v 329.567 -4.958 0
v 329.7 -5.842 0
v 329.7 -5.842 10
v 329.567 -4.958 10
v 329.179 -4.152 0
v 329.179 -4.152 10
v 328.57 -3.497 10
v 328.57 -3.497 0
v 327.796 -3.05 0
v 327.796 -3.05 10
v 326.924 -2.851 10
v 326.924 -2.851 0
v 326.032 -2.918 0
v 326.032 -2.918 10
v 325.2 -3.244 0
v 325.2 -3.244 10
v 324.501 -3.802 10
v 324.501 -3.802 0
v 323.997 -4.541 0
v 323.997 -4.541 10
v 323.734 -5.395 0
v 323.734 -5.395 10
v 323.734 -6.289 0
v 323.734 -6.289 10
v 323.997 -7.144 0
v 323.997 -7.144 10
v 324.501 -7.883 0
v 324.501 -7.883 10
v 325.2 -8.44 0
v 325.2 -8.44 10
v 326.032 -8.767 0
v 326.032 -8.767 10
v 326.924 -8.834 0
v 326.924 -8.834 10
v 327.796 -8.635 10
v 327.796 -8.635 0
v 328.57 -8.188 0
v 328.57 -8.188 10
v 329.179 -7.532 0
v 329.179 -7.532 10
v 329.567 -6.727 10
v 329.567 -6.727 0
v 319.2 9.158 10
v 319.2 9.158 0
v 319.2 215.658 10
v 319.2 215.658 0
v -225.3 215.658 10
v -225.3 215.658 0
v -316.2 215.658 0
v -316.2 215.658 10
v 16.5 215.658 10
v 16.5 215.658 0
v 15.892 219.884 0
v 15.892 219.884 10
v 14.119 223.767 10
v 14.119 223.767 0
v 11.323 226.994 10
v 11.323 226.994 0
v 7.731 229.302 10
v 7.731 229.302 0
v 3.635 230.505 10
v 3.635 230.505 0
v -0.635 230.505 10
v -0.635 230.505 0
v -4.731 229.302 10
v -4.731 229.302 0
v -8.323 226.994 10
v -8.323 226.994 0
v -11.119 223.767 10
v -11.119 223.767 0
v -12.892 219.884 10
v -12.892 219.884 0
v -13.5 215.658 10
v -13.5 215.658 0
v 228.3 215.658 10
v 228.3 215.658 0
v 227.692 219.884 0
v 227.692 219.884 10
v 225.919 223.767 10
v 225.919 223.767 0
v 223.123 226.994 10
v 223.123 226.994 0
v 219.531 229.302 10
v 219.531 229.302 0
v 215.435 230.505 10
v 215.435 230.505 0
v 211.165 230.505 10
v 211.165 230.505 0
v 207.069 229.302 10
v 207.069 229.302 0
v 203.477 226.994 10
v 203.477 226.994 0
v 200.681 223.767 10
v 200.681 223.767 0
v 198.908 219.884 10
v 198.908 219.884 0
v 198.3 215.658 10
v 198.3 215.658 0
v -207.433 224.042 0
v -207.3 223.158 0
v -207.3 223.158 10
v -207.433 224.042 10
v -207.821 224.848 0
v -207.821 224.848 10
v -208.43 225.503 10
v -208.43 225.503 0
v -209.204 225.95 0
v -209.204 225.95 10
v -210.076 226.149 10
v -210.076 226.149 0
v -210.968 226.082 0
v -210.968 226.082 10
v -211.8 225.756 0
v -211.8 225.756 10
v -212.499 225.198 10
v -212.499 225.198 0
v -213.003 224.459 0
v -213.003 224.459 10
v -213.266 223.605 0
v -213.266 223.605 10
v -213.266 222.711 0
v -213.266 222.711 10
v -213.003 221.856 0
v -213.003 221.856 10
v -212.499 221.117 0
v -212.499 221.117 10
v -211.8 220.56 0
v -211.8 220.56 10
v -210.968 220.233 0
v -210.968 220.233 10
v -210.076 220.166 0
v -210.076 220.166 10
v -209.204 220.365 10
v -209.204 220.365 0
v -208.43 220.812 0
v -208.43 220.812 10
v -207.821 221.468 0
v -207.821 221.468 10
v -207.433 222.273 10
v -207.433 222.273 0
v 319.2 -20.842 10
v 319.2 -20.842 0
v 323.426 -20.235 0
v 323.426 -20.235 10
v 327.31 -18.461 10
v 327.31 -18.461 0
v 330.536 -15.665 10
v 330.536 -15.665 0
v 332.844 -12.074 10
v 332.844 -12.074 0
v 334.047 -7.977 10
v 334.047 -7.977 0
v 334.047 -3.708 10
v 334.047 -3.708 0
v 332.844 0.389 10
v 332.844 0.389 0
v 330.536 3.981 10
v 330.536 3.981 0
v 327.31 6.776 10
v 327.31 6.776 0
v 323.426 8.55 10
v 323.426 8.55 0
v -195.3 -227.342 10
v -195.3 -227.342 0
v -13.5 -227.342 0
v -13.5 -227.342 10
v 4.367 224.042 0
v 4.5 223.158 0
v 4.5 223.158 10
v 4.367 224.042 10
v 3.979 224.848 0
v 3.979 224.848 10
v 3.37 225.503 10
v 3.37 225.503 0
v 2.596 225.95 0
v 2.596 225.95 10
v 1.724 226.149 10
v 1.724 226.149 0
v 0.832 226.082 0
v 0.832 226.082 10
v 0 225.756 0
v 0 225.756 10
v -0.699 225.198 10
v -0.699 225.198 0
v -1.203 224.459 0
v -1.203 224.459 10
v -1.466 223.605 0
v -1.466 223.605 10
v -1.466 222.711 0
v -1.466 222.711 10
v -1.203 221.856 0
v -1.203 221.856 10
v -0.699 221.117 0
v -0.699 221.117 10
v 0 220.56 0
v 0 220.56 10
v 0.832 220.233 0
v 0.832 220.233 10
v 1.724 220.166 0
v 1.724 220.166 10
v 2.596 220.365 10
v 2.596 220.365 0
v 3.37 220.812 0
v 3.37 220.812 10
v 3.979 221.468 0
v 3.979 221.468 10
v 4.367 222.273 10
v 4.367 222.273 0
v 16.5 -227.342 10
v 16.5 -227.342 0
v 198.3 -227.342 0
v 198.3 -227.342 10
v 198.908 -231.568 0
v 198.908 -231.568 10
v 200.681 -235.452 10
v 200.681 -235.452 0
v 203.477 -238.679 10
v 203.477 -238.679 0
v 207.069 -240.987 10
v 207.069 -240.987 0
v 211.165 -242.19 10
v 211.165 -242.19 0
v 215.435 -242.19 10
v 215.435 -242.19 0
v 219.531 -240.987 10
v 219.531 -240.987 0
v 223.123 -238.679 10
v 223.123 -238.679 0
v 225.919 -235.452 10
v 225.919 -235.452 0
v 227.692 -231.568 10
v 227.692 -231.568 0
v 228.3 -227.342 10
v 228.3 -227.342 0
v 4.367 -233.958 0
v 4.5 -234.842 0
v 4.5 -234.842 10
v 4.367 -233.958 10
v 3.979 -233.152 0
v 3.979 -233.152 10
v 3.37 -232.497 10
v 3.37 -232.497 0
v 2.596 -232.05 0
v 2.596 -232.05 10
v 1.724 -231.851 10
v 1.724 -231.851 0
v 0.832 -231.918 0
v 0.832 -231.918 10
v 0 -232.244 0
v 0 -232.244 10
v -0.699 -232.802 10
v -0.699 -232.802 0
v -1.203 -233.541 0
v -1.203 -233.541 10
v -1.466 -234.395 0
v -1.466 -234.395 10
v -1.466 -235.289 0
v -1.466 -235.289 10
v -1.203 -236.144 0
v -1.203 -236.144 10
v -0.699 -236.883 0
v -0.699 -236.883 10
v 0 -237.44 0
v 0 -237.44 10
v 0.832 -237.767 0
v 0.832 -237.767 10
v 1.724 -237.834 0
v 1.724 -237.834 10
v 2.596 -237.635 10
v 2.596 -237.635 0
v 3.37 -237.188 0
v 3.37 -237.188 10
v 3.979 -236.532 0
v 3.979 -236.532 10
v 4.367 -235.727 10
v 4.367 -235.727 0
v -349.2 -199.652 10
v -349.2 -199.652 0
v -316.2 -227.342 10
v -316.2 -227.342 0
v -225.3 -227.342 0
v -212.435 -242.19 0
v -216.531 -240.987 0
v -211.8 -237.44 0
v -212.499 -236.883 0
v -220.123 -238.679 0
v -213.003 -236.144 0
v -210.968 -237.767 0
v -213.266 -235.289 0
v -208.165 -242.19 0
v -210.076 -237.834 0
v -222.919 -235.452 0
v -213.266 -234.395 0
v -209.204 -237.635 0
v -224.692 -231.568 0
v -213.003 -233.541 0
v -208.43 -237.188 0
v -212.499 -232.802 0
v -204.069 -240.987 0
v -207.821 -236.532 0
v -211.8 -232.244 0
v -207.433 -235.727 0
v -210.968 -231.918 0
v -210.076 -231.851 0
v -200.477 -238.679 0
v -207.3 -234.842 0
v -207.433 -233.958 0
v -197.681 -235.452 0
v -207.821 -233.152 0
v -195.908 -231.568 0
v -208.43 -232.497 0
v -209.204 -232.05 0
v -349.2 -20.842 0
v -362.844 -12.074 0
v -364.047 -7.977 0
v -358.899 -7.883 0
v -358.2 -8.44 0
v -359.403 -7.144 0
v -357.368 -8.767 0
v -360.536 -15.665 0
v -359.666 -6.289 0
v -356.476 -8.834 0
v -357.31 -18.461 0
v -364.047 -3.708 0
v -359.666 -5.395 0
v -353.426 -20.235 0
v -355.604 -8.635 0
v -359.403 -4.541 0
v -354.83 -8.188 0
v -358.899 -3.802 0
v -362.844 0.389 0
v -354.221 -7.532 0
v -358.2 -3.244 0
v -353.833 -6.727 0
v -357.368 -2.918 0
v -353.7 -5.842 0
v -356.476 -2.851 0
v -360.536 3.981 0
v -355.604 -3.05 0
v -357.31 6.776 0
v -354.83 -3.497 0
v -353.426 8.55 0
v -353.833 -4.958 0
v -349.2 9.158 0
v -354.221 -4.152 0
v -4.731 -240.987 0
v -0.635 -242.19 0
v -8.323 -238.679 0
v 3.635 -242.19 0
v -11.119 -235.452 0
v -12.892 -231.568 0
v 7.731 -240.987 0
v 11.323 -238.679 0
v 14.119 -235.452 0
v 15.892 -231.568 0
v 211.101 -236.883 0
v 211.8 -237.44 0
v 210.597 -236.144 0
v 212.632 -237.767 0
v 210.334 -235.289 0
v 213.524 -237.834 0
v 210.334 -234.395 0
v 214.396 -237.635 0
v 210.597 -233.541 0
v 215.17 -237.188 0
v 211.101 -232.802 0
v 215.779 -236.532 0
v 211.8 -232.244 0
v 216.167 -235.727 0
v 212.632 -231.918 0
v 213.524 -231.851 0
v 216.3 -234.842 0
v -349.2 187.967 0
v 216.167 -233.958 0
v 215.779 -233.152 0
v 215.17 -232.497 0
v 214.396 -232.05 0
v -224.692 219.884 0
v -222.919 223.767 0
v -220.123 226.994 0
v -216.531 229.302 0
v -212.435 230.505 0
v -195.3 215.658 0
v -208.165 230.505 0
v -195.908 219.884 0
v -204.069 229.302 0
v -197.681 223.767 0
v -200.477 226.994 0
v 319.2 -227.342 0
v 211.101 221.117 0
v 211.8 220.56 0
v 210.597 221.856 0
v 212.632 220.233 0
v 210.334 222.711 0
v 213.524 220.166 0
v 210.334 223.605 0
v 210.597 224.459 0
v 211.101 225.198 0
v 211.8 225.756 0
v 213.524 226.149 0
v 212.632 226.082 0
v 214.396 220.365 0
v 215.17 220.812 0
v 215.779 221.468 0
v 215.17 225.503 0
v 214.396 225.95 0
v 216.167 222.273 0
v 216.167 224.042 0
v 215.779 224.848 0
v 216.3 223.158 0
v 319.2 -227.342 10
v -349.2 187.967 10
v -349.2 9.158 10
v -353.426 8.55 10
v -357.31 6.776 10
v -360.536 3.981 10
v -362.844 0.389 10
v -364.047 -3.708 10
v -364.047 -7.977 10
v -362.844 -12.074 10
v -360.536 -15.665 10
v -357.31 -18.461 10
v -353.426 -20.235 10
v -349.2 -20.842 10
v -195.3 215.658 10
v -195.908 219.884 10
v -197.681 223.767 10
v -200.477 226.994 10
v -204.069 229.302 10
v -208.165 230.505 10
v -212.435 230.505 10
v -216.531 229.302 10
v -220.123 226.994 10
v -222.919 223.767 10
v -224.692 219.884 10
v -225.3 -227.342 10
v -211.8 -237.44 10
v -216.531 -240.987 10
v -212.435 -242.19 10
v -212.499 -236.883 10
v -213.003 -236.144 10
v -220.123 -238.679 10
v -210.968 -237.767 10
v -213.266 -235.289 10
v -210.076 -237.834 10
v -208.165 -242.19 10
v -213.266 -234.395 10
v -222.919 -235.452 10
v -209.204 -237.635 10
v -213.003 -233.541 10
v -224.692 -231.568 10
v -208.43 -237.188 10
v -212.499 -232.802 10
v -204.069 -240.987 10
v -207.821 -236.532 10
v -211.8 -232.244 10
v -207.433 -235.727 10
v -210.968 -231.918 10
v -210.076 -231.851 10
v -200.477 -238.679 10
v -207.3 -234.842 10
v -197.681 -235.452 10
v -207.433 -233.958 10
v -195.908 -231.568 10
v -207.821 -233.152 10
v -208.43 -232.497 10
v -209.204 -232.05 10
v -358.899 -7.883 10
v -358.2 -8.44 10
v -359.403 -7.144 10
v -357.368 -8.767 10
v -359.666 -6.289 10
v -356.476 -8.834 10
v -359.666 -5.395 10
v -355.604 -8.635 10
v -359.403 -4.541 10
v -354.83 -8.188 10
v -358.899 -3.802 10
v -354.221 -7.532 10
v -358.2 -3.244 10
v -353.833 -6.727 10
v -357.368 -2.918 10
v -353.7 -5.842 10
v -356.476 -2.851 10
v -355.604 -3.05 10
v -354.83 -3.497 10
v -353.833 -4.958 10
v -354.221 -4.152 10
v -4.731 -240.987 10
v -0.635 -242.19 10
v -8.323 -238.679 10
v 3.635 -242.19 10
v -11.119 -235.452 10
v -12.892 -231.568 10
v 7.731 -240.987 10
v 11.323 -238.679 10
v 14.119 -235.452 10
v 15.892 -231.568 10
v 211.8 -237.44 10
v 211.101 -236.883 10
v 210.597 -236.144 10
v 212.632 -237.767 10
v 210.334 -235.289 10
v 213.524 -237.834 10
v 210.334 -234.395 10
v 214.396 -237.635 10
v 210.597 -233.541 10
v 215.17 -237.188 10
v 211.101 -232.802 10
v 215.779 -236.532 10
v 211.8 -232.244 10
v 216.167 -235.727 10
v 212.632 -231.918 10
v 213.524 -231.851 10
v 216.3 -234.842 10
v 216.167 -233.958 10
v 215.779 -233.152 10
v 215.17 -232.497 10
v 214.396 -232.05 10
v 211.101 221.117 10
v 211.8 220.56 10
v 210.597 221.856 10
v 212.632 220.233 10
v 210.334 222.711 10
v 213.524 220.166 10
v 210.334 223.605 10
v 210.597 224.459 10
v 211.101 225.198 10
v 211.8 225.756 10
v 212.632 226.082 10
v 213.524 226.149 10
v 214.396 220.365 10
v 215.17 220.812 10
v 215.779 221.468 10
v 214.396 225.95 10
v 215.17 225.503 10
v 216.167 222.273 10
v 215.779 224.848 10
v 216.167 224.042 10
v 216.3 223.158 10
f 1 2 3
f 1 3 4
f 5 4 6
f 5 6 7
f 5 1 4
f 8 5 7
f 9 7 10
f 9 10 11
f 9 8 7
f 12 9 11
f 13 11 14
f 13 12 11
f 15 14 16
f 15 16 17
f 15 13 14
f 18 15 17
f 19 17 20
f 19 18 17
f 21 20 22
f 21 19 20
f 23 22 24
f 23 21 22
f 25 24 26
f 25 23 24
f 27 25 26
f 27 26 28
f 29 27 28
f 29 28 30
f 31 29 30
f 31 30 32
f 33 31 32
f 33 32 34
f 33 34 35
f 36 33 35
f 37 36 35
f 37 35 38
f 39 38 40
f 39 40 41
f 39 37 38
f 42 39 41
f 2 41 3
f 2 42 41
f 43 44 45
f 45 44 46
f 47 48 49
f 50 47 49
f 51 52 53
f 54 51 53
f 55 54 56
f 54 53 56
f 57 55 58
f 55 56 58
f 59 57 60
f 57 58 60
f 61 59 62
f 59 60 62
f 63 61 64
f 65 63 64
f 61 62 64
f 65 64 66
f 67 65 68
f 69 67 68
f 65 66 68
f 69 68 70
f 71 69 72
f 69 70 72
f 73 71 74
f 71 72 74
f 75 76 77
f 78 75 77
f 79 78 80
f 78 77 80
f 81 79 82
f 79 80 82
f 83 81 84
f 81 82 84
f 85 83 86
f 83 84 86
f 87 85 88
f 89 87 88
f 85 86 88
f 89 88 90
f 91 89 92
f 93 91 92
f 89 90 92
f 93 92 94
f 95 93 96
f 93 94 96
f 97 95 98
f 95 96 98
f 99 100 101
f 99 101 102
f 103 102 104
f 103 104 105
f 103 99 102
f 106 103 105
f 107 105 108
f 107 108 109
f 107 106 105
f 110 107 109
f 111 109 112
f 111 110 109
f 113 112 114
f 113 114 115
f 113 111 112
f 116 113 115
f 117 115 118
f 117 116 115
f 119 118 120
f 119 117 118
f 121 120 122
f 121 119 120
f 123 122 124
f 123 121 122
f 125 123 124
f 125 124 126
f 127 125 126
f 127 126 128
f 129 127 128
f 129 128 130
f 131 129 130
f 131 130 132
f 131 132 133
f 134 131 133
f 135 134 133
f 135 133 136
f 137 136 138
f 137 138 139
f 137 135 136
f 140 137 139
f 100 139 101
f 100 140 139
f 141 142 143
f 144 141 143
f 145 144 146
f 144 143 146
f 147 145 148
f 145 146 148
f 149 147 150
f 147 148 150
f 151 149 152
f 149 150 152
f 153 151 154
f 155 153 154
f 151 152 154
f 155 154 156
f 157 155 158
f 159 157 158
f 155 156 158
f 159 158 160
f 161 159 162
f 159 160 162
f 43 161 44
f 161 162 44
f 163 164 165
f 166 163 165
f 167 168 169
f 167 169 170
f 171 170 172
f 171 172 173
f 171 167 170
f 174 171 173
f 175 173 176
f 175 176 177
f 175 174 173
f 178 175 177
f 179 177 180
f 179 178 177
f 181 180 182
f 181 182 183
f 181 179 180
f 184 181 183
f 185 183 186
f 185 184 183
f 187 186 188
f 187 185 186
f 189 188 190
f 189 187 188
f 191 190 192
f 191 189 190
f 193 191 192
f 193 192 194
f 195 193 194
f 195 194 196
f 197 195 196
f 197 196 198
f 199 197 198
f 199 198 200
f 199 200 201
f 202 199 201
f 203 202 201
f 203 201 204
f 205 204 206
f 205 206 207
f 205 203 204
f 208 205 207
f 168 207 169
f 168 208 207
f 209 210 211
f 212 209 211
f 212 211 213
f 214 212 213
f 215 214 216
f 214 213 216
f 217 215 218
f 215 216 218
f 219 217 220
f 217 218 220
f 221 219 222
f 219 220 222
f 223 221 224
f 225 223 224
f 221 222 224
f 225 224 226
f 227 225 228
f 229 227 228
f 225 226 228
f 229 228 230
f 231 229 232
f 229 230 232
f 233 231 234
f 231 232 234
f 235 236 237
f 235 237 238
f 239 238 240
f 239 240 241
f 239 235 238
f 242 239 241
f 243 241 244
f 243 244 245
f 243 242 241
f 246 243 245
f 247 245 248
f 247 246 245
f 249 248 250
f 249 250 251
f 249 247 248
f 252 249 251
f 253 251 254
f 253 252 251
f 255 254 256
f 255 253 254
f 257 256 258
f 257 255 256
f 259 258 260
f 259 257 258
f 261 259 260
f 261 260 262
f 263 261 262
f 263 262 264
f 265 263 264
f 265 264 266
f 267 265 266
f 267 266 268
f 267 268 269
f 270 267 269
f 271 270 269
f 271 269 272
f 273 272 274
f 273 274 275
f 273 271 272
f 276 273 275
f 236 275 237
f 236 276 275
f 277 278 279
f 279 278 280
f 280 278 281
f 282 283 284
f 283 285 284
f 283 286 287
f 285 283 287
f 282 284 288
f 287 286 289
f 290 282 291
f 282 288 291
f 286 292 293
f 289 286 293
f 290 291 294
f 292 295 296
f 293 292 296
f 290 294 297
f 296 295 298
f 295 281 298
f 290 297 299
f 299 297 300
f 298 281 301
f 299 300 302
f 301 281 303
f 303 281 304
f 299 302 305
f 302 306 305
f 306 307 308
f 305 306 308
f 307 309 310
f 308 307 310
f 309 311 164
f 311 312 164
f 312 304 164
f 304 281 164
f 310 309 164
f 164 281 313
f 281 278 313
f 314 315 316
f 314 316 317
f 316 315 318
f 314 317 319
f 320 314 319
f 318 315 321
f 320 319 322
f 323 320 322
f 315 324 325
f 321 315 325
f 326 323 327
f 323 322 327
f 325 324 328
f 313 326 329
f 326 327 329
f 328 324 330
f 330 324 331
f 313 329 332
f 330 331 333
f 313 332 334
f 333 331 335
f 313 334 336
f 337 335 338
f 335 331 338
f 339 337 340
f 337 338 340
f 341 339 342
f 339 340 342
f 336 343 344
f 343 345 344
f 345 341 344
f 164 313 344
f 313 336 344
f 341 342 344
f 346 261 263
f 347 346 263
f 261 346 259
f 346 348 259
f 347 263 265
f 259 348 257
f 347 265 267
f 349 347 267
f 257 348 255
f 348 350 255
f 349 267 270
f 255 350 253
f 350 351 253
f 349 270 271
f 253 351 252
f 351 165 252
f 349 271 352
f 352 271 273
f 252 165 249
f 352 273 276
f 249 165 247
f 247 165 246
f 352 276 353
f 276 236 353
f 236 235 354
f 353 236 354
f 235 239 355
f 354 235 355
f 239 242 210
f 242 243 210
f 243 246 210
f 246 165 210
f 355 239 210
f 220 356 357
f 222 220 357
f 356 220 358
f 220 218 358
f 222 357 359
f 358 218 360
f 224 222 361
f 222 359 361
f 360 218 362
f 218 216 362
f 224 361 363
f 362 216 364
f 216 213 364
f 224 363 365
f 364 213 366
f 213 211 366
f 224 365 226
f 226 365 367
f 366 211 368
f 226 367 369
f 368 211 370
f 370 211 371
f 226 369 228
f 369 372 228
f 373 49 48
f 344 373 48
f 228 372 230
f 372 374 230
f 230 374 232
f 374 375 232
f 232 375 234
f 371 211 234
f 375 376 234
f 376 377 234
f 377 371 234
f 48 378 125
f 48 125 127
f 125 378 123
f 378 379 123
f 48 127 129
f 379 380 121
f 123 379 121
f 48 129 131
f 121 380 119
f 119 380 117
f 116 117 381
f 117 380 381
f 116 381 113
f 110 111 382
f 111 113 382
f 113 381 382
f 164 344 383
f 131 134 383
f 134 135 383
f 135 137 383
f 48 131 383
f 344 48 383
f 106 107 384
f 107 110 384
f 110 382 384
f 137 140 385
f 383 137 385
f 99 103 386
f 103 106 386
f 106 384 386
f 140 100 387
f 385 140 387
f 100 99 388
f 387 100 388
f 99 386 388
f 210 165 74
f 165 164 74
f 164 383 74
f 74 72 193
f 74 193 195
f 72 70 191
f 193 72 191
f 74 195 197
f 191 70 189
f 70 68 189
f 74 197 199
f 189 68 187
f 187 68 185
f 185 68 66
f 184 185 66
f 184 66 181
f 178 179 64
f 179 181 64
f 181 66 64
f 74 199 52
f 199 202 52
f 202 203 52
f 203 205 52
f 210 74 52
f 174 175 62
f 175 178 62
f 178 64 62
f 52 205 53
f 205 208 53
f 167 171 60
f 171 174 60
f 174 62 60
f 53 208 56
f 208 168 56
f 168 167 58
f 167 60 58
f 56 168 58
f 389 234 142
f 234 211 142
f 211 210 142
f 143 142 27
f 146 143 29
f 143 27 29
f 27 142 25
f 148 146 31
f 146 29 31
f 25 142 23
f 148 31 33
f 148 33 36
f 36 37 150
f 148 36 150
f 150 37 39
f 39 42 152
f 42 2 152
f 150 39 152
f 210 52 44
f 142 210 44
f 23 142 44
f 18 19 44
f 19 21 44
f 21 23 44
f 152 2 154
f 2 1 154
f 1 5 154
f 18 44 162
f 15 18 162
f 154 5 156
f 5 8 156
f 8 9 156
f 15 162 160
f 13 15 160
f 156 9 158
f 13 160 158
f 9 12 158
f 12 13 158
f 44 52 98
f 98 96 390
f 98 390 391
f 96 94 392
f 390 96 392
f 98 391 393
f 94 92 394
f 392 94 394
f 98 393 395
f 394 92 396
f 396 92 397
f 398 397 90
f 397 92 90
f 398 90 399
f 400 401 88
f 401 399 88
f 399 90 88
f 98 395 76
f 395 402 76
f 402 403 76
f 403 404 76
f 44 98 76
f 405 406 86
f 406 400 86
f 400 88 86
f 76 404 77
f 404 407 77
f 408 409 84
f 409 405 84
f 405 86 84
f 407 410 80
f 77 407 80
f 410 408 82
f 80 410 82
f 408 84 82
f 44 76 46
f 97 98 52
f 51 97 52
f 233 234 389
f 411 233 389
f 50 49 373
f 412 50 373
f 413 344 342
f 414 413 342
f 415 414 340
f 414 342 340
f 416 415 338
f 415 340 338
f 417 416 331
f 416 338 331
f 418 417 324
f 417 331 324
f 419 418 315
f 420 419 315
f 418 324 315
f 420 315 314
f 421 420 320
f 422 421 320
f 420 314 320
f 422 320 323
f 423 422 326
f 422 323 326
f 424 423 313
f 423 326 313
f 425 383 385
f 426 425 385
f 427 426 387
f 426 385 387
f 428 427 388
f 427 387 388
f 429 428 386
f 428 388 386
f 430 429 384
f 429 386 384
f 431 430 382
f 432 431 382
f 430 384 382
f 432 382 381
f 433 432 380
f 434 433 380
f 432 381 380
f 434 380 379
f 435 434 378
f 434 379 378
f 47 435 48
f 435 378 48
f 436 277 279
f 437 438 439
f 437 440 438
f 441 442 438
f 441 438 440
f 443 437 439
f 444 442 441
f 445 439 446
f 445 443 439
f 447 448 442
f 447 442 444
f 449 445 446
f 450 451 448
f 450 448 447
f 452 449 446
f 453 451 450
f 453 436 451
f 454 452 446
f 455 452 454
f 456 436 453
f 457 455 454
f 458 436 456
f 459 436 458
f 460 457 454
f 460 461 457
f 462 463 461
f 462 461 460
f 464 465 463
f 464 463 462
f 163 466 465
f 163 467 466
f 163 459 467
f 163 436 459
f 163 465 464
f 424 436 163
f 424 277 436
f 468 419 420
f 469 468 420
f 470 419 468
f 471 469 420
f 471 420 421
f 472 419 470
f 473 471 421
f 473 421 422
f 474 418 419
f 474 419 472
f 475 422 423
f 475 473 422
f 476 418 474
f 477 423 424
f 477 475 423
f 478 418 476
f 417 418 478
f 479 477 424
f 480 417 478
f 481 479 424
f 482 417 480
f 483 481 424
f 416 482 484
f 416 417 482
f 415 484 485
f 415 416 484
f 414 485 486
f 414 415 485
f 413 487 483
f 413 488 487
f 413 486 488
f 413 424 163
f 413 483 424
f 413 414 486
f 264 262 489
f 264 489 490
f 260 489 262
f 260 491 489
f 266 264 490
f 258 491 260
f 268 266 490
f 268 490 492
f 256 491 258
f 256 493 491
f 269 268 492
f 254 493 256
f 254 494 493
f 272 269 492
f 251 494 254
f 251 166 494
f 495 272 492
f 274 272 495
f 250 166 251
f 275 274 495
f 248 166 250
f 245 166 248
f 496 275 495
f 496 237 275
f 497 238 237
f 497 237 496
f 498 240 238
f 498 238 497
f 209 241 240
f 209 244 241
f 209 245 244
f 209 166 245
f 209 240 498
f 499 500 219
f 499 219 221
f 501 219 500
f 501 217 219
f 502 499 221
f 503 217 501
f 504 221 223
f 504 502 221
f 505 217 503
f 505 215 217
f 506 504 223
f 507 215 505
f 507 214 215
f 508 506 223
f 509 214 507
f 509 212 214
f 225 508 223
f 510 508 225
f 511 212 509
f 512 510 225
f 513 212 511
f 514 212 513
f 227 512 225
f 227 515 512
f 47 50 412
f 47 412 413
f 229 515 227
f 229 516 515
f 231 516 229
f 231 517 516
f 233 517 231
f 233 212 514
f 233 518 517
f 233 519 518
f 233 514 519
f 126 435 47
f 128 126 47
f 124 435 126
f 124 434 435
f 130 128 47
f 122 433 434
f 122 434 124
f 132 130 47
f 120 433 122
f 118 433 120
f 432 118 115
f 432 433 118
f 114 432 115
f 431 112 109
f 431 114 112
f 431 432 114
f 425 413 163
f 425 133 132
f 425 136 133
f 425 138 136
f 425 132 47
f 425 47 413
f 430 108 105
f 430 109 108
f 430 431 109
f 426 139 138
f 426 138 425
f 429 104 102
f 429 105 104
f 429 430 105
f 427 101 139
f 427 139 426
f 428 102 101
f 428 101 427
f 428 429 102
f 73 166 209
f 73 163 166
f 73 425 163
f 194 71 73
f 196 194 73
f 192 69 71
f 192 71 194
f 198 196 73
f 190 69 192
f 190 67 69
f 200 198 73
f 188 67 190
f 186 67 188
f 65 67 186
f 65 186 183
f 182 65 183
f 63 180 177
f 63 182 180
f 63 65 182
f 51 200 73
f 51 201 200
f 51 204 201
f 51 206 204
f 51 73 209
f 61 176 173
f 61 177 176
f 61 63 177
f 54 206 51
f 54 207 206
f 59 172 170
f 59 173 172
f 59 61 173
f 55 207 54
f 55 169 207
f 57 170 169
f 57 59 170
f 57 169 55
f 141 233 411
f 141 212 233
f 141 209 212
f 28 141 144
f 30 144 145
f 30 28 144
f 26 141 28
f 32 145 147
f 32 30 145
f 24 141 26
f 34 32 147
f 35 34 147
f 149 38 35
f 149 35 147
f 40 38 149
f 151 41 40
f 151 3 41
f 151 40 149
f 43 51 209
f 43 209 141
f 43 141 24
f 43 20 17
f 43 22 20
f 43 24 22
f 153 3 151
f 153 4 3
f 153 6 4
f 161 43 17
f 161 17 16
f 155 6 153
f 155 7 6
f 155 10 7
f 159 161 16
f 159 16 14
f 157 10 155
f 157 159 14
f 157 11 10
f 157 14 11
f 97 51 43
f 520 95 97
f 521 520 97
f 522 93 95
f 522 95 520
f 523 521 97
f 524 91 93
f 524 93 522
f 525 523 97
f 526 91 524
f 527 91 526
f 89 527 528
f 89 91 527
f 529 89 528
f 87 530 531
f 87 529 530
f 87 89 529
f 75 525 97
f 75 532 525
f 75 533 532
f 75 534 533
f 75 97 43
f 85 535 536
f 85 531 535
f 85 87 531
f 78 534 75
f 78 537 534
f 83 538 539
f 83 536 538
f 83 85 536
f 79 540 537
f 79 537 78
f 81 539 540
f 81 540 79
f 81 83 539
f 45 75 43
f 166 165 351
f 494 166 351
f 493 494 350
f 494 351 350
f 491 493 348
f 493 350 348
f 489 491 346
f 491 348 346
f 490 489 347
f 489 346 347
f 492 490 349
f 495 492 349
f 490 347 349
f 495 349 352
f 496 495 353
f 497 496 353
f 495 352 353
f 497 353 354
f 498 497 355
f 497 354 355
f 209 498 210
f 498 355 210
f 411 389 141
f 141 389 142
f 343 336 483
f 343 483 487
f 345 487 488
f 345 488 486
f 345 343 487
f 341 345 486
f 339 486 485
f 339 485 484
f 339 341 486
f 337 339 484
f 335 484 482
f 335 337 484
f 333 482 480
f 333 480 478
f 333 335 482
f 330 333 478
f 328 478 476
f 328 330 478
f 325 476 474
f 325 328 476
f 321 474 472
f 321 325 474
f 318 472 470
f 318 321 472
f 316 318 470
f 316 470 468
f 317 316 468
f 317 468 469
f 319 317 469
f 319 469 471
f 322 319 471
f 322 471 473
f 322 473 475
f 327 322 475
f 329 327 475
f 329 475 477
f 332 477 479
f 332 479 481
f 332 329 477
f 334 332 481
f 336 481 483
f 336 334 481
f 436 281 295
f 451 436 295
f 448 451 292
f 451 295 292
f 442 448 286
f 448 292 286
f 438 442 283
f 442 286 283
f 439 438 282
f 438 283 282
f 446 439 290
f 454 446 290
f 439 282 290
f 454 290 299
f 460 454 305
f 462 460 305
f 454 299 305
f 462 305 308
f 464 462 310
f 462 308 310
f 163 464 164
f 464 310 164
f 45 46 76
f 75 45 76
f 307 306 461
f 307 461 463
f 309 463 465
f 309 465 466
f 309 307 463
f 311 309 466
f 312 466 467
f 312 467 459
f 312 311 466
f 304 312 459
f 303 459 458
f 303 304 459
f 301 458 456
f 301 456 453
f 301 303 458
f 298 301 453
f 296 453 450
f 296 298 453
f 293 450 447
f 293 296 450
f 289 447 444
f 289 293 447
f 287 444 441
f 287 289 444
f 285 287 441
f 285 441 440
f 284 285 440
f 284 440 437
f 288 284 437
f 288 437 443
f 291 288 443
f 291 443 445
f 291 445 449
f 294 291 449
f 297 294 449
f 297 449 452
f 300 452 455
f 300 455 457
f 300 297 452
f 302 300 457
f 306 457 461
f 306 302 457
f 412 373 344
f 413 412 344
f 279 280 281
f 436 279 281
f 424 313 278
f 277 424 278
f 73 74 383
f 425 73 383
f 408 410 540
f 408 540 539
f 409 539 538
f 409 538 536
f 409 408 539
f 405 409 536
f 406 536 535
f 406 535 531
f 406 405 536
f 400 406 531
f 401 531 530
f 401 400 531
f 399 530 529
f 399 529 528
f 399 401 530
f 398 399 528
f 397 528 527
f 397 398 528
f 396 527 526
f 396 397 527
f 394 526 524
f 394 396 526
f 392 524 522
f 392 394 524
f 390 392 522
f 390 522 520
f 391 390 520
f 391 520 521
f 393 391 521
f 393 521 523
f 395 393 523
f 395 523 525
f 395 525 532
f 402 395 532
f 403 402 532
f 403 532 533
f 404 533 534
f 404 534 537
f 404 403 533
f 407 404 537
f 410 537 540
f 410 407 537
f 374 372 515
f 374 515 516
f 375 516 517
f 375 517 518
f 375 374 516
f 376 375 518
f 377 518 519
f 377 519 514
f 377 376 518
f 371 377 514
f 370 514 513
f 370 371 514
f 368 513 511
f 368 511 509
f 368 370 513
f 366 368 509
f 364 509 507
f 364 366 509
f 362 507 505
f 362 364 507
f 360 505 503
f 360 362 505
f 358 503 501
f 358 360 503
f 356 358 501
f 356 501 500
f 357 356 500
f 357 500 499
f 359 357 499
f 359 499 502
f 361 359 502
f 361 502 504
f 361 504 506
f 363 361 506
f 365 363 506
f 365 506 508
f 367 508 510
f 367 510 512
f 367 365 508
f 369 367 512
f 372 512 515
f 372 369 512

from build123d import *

# Parameters (mm, degrees)
SKETCH1_R           = 3
BOSS_EXTRUDE1_DEPTH = 10


with BuildPart() as part:
    # Sketch1 → Boss-Extrude1 (new body)
    with BuildSketch(Plane.XY):
        with BuildLine():
            Line((319.2, -227.34232335), (319.2, -20.84232335))
            ThreePointArc((319.2, -20.84232335), (334.2, -5.84232335), (319.2, 9.15767665))
            Line((319.2, 9.15767665), (319.2, 215.65767665))
            Line((319.2, 215.65767665), (228.3, 215.65767665))
            ThreePointArc((228.3, 215.65767665), (213.3, 230.65767665), (198.3, 215.65767665))
            Line((198.3, 215.65767665), (16.5, 215.65767665))
            ThreePointArc((16.5, 215.65767665), (1.5, 230.65767665), (-13.5, 215.65767665))
            Line((-13.5, 215.65767665), (-195.3, 215.65767665))
            ThreePointArc((-195.3, 215.65767665), (-210.3, 230.65767665), (-225.3, 215.65767665))
            Line((-225.3, 215.65767665), (-316.2, 215.65767665))
            Line((-316.2, 215.65767665), (-349.2, 187.967388821))
            Line((-349.2, 187.967388821), (-349.2, 9.15767665))
            ThreePointArc((-349.2, 9.15767665), (-364.2, -5.84232335), (-349.2, -20.84232335))
            Line((-349.2, -20.84232335), (-349.2, -199.652035521))
            Line((-349.2, -199.652035521), (-316.2, -227.34232335))
            Line((-316.2, -227.34232335), (-225.3, -227.34232335))
            ThreePointArc((-225.3, -227.34232335), (-210.3, -242.34232335), (-195.3, -227.34232335))
            Line((-195.3, -227.34232335), (-13.5, -227.34232335))
            ThreePointArc((-13.5, -227.34232335), (1.5, -242.34232335), (16.5, -227.34232335))
            Line((16.5, -227.34232335), (198.3, -227.34232335))
            ThreePointArc((198.3, -227.34232335), (213.3, -242.34232335), (228.3, -227.34232335))
            Line((228.3, -227.34232335), (319.2, -227.34232335))
        make_face()
        with Locations((-210.3, 223.15767665)):
            Circle(SKETCH1_R, mode=Mode.SUBTRACT)
        with Locations((1.5, 223.15767665)):
            Circle(SKETCH1_R, mode=Mode.SUBTRACT)
        with Locations((213.3, 223.15767665)):
            Circle(SKETCH1_R, mode=Mode.SUBTRACT)
        with Locations((326.7, -5.84232335)):
            Circle(SKETCH1_R, mode=Mode.SUBTRACT)
        with Locations((-356.7, -5.84232335)):
            Circle(SKETCH1_R, mode=Mode.SUBTRACT)
        with Locations((-210.3, -234.84232335)):
            Circle(SKETCH1_R, mode=Mode.SUBTRACT)
        with Locations((1.5, -234.84232335)):
            Circle(SKETCH1_R, mode=Mode.SUBTRACT)
        with Locations((213.3, -234.84232335)):
            Circle(SKETCH1_R, mode=Mode.SUBTRACT)
    extrude(amount=BOSS_EXTRUDE1_DEPTH)


solid = part.part
